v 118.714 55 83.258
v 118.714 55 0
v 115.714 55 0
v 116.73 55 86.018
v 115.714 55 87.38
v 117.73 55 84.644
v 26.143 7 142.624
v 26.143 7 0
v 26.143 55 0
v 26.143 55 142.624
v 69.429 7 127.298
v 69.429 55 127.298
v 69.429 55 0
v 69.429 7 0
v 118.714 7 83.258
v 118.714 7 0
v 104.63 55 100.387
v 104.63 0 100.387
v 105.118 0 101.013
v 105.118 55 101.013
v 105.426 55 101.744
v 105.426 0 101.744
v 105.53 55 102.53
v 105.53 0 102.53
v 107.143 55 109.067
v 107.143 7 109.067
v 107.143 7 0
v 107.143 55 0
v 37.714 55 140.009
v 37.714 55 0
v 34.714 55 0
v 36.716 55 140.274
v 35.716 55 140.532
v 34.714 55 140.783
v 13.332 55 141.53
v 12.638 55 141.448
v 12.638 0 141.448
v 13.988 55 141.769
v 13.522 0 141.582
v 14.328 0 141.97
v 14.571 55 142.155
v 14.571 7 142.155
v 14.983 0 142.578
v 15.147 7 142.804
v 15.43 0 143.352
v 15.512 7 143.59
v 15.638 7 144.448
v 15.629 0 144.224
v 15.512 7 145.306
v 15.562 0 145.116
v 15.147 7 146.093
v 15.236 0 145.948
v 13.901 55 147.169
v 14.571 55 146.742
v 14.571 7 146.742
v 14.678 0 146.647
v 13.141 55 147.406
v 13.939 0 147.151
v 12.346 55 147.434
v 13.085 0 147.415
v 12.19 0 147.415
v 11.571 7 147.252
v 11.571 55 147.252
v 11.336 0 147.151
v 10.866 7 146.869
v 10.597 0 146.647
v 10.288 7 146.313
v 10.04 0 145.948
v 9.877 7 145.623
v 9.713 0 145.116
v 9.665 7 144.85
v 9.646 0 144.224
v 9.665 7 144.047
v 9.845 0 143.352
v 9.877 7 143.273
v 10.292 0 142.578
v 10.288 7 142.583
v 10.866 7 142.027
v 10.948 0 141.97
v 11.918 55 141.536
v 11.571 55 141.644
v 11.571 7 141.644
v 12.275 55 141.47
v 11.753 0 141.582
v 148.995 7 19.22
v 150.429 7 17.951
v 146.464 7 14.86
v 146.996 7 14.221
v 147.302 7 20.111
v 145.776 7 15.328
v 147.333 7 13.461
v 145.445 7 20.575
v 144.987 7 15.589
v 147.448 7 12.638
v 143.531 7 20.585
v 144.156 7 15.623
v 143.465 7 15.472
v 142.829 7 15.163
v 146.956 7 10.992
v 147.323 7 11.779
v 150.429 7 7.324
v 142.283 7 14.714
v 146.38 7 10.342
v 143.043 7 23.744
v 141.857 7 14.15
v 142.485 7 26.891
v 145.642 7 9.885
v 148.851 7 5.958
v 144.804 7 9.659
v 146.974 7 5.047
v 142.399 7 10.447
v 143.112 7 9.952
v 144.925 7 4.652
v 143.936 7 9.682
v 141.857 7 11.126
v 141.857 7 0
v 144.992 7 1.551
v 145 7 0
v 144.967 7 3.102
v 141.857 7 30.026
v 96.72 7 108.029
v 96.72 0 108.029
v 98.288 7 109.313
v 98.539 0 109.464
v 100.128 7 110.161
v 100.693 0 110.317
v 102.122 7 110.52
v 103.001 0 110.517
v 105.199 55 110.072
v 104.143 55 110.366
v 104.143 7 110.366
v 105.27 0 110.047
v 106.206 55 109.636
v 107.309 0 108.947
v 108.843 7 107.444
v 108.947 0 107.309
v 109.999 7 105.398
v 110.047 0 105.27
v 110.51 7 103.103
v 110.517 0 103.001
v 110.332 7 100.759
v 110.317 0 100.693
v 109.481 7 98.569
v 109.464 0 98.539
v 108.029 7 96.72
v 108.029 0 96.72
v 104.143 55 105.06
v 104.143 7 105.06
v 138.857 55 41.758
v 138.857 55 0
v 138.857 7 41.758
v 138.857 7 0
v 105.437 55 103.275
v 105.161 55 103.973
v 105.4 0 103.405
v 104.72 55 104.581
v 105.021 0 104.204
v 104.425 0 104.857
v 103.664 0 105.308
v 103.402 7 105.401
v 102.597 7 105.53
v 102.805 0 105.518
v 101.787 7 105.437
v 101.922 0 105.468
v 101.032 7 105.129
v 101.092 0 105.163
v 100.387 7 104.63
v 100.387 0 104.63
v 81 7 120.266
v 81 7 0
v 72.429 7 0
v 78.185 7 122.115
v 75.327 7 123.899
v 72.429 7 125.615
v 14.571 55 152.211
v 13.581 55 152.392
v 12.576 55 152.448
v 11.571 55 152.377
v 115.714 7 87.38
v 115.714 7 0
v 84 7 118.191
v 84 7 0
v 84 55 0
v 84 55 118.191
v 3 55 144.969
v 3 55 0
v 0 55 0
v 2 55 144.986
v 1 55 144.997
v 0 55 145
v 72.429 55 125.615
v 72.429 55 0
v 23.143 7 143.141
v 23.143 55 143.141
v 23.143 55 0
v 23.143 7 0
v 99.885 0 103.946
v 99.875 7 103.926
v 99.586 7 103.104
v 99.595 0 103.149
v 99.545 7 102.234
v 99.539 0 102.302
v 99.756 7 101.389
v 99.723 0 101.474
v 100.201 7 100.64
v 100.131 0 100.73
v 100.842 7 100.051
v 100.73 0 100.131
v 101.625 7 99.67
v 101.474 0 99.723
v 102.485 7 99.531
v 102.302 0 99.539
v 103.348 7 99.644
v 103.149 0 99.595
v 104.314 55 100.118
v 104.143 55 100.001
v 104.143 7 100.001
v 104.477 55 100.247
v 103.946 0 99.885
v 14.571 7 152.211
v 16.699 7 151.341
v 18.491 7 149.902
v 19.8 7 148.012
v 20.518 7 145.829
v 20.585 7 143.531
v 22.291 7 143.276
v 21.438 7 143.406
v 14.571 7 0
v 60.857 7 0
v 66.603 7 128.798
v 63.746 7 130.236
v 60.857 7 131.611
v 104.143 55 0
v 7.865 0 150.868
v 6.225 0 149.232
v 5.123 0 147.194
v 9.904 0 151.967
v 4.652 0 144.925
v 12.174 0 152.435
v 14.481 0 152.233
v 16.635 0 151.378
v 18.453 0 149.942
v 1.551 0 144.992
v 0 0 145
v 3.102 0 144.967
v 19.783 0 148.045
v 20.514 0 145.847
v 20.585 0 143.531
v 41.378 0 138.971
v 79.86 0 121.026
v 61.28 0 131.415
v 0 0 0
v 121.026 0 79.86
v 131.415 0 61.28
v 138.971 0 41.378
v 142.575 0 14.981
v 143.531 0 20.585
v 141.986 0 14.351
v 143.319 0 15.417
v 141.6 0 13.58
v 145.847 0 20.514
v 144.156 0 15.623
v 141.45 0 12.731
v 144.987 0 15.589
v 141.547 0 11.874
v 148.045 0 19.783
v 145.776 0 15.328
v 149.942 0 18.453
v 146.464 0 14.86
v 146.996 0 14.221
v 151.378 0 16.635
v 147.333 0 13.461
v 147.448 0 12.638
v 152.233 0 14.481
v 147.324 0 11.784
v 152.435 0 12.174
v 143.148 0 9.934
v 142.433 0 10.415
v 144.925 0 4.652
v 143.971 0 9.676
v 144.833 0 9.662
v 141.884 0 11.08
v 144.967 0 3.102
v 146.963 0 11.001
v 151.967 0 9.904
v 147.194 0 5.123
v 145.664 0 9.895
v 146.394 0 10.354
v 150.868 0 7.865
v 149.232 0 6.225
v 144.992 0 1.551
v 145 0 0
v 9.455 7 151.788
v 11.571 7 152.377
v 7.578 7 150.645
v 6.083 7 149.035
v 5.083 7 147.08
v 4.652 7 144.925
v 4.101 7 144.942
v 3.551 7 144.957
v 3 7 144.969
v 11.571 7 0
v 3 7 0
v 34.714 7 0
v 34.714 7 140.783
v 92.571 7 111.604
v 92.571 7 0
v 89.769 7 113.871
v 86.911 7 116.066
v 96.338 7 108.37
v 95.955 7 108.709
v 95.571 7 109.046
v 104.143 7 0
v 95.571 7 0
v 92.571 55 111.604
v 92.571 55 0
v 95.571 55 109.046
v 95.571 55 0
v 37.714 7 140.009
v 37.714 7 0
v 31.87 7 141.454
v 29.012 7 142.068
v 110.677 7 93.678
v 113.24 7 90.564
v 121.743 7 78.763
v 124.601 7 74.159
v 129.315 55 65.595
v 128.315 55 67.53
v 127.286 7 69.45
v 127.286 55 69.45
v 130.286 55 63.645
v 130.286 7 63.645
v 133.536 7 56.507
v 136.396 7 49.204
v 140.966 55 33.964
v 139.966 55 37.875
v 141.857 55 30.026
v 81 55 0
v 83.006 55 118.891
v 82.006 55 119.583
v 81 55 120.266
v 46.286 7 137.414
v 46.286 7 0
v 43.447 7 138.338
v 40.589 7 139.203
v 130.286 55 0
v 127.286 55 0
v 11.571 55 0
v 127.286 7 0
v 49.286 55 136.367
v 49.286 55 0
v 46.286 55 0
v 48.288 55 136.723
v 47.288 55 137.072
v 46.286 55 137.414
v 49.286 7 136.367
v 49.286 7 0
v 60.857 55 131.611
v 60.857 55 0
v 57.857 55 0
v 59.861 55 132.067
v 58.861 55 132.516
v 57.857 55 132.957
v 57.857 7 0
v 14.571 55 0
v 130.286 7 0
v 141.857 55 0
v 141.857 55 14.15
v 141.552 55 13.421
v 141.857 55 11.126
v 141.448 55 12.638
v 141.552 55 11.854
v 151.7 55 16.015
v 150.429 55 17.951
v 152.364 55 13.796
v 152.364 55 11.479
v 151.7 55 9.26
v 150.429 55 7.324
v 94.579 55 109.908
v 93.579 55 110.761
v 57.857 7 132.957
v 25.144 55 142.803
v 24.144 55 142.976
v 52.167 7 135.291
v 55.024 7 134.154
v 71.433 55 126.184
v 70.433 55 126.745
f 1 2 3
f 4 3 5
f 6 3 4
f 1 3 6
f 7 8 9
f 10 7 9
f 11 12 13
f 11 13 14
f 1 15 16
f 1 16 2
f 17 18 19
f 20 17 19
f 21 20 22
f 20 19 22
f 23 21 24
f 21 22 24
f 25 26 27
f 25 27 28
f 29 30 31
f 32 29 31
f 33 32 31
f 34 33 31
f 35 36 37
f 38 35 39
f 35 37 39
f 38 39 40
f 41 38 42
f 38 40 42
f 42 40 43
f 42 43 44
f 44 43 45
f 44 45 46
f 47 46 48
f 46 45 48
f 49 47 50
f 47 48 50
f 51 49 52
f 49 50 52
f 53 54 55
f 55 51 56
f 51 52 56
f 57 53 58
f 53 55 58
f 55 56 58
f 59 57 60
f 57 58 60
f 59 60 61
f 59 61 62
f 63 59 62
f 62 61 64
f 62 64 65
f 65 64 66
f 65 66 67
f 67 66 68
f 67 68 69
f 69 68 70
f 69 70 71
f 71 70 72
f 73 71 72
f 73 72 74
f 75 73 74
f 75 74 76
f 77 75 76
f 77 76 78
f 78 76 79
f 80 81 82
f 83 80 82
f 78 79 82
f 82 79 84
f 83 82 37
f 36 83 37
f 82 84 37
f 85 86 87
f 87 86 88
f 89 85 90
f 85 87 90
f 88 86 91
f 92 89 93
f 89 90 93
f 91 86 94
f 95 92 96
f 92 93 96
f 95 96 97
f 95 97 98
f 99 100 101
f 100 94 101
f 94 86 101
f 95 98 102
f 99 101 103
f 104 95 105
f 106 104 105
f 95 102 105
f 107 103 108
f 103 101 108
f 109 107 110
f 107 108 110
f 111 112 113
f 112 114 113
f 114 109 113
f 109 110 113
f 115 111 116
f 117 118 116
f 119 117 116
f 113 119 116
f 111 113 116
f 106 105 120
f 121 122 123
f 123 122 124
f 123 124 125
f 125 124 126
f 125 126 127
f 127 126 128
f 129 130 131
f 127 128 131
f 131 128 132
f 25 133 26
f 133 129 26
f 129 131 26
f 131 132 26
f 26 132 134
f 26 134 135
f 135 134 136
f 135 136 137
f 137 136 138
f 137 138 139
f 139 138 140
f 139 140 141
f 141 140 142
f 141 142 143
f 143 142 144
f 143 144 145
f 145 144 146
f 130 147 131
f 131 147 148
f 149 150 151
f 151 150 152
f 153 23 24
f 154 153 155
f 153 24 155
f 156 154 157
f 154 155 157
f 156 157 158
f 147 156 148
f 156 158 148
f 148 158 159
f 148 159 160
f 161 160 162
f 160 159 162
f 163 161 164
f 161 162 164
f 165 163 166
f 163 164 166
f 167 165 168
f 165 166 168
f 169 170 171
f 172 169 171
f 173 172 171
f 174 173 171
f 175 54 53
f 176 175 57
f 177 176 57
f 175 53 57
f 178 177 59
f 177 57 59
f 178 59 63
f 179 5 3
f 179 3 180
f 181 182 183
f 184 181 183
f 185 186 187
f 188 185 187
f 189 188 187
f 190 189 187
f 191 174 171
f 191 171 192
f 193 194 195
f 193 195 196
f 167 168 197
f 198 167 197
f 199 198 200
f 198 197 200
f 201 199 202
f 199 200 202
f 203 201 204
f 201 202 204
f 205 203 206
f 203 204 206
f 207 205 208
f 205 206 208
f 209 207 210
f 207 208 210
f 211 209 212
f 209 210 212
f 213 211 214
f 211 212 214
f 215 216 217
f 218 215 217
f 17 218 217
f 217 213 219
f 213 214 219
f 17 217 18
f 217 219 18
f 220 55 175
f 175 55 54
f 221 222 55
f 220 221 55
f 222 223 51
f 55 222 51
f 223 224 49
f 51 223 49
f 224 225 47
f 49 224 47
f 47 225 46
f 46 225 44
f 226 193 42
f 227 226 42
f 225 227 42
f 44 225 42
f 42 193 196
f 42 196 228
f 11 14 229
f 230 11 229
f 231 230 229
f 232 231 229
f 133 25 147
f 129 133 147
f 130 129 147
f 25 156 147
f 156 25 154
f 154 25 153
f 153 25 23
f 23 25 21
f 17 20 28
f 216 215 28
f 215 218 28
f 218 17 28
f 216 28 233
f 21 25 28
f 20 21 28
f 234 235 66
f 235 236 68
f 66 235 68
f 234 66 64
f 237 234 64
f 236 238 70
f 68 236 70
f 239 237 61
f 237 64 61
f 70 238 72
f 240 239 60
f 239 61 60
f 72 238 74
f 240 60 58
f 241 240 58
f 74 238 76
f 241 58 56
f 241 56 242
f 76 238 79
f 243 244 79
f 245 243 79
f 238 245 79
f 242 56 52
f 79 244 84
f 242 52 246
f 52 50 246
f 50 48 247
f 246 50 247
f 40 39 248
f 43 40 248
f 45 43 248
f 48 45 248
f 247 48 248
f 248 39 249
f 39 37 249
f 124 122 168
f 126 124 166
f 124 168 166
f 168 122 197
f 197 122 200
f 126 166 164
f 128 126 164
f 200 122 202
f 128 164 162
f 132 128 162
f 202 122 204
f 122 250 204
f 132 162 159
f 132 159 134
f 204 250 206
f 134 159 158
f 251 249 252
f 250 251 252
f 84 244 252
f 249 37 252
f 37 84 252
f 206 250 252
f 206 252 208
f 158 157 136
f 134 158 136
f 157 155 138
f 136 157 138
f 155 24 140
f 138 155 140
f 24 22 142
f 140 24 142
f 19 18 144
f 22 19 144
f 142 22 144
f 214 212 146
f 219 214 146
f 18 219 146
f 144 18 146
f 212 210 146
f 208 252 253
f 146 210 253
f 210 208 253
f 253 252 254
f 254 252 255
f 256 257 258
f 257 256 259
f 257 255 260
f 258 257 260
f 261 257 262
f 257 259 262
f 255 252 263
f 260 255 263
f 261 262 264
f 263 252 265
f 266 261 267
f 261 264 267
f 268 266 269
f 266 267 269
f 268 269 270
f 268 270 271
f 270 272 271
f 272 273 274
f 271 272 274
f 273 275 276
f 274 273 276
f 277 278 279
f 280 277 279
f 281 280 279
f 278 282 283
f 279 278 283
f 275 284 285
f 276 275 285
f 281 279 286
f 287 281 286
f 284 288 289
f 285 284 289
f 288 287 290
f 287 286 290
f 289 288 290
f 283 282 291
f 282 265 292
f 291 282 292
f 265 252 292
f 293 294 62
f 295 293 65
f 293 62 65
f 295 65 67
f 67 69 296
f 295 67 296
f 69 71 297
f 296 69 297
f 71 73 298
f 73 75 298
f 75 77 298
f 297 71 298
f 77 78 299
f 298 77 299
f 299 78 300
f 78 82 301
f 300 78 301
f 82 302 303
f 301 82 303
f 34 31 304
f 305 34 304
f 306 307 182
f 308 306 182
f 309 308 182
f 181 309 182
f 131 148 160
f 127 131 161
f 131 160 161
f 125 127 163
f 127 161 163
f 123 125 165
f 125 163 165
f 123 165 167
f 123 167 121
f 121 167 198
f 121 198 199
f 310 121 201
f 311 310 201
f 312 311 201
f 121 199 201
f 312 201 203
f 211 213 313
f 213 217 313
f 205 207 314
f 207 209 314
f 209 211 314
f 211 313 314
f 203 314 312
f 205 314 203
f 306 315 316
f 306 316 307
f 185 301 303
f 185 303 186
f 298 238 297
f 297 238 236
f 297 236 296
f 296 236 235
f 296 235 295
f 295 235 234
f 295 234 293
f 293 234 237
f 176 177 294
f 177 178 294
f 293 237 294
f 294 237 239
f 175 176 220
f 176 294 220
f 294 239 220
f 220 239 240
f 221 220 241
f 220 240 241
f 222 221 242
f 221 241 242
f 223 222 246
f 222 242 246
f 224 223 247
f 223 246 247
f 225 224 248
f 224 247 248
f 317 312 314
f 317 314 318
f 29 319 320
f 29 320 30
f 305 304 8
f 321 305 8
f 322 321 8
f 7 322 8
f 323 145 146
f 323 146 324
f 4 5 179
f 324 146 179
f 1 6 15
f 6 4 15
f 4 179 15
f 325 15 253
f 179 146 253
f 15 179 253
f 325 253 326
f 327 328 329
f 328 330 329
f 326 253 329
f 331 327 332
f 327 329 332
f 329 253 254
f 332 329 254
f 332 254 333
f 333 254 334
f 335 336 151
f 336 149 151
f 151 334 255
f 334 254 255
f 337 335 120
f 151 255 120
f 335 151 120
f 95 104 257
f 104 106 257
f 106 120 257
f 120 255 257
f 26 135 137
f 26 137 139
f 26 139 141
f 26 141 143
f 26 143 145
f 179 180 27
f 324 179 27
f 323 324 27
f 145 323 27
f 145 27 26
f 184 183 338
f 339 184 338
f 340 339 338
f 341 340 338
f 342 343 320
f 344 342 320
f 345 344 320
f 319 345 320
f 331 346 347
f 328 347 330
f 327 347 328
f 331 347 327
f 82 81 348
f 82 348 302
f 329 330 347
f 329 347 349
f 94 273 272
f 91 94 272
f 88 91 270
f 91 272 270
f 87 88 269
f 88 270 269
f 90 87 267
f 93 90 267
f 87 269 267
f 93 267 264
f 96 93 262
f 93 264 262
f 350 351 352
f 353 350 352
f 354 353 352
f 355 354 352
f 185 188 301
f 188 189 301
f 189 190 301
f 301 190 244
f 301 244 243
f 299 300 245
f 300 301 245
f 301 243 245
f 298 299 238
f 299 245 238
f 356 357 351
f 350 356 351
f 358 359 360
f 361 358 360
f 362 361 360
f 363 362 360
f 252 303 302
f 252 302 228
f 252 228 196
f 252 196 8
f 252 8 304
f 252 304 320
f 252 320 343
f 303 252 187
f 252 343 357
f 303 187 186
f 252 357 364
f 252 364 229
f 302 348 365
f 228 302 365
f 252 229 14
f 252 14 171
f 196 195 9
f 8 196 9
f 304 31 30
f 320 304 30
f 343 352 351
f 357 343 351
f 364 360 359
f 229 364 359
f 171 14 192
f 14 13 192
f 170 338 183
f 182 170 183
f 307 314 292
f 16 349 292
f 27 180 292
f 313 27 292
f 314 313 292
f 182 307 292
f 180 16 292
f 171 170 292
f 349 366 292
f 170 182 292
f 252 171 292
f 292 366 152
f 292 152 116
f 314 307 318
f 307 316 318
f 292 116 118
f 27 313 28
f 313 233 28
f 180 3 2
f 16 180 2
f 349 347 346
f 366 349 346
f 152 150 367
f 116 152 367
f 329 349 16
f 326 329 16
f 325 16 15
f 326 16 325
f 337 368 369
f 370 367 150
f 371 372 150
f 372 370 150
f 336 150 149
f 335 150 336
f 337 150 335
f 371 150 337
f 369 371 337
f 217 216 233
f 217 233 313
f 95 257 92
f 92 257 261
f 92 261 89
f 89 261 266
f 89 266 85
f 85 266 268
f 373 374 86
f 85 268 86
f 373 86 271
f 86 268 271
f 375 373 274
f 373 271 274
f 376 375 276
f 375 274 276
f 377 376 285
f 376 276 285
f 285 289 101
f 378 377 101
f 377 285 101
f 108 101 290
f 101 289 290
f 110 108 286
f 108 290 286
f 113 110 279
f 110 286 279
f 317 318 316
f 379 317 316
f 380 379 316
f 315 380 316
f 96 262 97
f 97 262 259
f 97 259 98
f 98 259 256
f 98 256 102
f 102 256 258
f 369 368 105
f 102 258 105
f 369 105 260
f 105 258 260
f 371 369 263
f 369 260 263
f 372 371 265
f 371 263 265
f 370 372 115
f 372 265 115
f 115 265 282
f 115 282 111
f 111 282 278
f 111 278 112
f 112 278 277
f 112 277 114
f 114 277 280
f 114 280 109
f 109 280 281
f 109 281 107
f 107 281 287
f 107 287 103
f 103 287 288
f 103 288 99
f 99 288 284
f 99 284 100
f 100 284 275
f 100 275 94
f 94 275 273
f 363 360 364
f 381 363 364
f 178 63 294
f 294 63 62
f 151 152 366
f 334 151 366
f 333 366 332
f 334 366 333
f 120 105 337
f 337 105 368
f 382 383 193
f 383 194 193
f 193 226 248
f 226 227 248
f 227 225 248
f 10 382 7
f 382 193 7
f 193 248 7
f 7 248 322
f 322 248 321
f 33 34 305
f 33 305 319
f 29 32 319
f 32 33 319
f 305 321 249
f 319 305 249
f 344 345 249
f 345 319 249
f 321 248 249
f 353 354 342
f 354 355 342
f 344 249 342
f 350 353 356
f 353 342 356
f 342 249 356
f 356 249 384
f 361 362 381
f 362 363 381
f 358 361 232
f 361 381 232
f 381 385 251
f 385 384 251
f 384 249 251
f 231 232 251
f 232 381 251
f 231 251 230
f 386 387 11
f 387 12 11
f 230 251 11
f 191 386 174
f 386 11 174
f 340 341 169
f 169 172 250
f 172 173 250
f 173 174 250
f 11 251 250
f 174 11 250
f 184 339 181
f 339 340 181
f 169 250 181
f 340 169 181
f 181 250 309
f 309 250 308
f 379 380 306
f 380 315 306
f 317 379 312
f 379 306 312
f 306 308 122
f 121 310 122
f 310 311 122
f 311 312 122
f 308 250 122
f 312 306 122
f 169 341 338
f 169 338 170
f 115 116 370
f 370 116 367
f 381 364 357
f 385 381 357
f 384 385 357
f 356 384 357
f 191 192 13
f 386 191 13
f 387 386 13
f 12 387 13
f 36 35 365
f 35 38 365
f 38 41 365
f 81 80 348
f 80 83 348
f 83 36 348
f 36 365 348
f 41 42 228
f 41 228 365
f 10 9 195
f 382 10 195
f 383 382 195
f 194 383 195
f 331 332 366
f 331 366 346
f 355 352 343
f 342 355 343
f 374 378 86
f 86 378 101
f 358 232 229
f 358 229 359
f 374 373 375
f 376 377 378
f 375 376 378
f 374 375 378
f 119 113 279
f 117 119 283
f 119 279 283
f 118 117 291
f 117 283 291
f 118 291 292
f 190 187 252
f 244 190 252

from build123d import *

# Parameters (mm, degrees)
BOSS_EXTRUDE1_DEPTH = 1000
SKETCH2_R           = 3
CUT_EXTRUDE2_DEPTH  = 1016.012315196


with BuildPart() as part:
    # Sketch1 → Boss-Extrude1 (new body)
    with BuildSketch(Plane.XY):
        Polygon((11.571428571, 55), (11.571428571, 7), (3, 7), (3, 55), (0, 55), (0, 7), (0, 0), (165, 0), (165, 7), (165, 10), (165, 55), (162, 55), (162, 7), (153.428571429, 7), (153.428571429, 55), (150.428571429, 55), (150.428571429, 7), (141.857142857, 7), (141.857142857, 55), (138.857142857, 55), (138.857142857, 7), (130.285714286, 7), (130.285714286, 55), (127.285714286, 55), (127.285714286, 7), (118.714285714, 7), (118.714285714, 55), (115.714285714, 55), (115.714285714, 7), (107.142857143, 7), (107.142857143, 55), (104.142857143, 55), (104.142857143, 7), (95.571428571, 7), (95.571428571, 55), (92.571428571, 55), (92.571428571, 7), (84, 7), (84, 55), (81, 55), (81, 7), (72.428571429, 7), (72.428571429, 55), (69.428571429, 55), (69.428571429, 7), (60.857142857, 7), (60.857142857, 55), (57.857142857, 55), (57.857142857, 7), (49.285714286, 7), (49.285714286, 55), (46.285714286, 55), (46.285714286, 7), (37.714285714, 7), (37.714285714, 55), (34.714285714, 55), (34.714285714, 7), (26.142857143, 7), (26.142857143, 55), (23.142857143, 55), (23.142857143, 7), (14.571428571, 7), (14.571428571, 55), align=None)
    extrude(amount=BOSS_EXTRUDE1_DEPTH)

    # Sketch2 → Cut-Extrude2 (cut, through all)
    with BuildSketch(Plane.XZ):
        with BuildLine():
            Line((0, 1000), (0, 145))
            ThreePointArc((0, 145), (2.326211237, 144.981339286), (4.651823732, 144.925361949))
            ThreePointArc((4.651823732, 144.925361949), (13.33482864, 152.417788808), (20.584872923, 143.531400769))
            ThreePointArc((20.584872923, 143.531400769), (61.279647952, 131.41462912), (96.71973071, 108.02913353))
            ThreePointArc((96.71973071, 108.02913353), (108.187337522, 108.187337522), (108.02913353, 96.71973071))
            ThreePointArc((108.02913353, 96.71973071), (131.41462912, 61.279647952), (143.531400769, 20.584872923))
            ThreePointArc((143.531400769, 20.584872923), (152.417788808, 13.33482864), (144.925361949, 4.651823732))
            ThreePointArc((144.925361949, 4.651823732), (144.981339286, 2.326211237), (145, 0))
            Line((145, 0), (165, 0))
            Line((165, 0), (165, 1000))
            Line((165, 1000), (0, 1000))
        make_face()
        with BuildLine():
            ThreePointArc((144.678768073, 9.646453687), (146.649550209, 10.599398525), (147.448231223, 12.637582698))
            ThreePointArc((147.448231223, 12.637582698), (146.46353407, 14.859868557), (144.155861599, 15.623302043))
            ThreePointArc((144.155861599, 15.623302043), (144.448231223, 12.637582698), (144.678768073, 9.646453687))
        make_face()
        with BuildLine():
            ThreePointArc((144.678768073, 9.646453687), (144.448231223, 12.637582698), (144.155861599, 15.623302043))
            ThreePointArc((144.155861599, 15.623302043), (141.459647129, 12.37611547), (144.678768073, 9.646453687))
        make_face()
        with BuildLine():
            ThreePointArc((104.629745412, 100.387331745), (105.296146522, 101.368112079), (105.530483272, 102.530483272))
            ThreePointArc((105.530483272, 102.530483272), (103.664181958, 105.308023063), (100.387331745, 104.629745412))
            ThreePointArc((100.387331745, 104.629745412), (102.530483272, 102.530483272), (104.629745412, 100.387331745))
        make_face()
        with BuildLine():
            ThreePointArc((104.629745412, 100.387331745), (102.530483272, 102.530483272), (100.387331745, 104.629745412))
            ThreePointArc((100.387331745, 104.629745412), (100.409162928, 100.409162928), (104.629745412, 100.387331745))
        make_face()
        with Locations(Location((12.637582698, 144.448231223, 0), (0, 0, 270))):
            Circle(SKETCH2_R)
    extrude(amount=-CUT_EXTRUDE2_DEPTH, mode=Mode.SUBTRACT)


solid = part.part
